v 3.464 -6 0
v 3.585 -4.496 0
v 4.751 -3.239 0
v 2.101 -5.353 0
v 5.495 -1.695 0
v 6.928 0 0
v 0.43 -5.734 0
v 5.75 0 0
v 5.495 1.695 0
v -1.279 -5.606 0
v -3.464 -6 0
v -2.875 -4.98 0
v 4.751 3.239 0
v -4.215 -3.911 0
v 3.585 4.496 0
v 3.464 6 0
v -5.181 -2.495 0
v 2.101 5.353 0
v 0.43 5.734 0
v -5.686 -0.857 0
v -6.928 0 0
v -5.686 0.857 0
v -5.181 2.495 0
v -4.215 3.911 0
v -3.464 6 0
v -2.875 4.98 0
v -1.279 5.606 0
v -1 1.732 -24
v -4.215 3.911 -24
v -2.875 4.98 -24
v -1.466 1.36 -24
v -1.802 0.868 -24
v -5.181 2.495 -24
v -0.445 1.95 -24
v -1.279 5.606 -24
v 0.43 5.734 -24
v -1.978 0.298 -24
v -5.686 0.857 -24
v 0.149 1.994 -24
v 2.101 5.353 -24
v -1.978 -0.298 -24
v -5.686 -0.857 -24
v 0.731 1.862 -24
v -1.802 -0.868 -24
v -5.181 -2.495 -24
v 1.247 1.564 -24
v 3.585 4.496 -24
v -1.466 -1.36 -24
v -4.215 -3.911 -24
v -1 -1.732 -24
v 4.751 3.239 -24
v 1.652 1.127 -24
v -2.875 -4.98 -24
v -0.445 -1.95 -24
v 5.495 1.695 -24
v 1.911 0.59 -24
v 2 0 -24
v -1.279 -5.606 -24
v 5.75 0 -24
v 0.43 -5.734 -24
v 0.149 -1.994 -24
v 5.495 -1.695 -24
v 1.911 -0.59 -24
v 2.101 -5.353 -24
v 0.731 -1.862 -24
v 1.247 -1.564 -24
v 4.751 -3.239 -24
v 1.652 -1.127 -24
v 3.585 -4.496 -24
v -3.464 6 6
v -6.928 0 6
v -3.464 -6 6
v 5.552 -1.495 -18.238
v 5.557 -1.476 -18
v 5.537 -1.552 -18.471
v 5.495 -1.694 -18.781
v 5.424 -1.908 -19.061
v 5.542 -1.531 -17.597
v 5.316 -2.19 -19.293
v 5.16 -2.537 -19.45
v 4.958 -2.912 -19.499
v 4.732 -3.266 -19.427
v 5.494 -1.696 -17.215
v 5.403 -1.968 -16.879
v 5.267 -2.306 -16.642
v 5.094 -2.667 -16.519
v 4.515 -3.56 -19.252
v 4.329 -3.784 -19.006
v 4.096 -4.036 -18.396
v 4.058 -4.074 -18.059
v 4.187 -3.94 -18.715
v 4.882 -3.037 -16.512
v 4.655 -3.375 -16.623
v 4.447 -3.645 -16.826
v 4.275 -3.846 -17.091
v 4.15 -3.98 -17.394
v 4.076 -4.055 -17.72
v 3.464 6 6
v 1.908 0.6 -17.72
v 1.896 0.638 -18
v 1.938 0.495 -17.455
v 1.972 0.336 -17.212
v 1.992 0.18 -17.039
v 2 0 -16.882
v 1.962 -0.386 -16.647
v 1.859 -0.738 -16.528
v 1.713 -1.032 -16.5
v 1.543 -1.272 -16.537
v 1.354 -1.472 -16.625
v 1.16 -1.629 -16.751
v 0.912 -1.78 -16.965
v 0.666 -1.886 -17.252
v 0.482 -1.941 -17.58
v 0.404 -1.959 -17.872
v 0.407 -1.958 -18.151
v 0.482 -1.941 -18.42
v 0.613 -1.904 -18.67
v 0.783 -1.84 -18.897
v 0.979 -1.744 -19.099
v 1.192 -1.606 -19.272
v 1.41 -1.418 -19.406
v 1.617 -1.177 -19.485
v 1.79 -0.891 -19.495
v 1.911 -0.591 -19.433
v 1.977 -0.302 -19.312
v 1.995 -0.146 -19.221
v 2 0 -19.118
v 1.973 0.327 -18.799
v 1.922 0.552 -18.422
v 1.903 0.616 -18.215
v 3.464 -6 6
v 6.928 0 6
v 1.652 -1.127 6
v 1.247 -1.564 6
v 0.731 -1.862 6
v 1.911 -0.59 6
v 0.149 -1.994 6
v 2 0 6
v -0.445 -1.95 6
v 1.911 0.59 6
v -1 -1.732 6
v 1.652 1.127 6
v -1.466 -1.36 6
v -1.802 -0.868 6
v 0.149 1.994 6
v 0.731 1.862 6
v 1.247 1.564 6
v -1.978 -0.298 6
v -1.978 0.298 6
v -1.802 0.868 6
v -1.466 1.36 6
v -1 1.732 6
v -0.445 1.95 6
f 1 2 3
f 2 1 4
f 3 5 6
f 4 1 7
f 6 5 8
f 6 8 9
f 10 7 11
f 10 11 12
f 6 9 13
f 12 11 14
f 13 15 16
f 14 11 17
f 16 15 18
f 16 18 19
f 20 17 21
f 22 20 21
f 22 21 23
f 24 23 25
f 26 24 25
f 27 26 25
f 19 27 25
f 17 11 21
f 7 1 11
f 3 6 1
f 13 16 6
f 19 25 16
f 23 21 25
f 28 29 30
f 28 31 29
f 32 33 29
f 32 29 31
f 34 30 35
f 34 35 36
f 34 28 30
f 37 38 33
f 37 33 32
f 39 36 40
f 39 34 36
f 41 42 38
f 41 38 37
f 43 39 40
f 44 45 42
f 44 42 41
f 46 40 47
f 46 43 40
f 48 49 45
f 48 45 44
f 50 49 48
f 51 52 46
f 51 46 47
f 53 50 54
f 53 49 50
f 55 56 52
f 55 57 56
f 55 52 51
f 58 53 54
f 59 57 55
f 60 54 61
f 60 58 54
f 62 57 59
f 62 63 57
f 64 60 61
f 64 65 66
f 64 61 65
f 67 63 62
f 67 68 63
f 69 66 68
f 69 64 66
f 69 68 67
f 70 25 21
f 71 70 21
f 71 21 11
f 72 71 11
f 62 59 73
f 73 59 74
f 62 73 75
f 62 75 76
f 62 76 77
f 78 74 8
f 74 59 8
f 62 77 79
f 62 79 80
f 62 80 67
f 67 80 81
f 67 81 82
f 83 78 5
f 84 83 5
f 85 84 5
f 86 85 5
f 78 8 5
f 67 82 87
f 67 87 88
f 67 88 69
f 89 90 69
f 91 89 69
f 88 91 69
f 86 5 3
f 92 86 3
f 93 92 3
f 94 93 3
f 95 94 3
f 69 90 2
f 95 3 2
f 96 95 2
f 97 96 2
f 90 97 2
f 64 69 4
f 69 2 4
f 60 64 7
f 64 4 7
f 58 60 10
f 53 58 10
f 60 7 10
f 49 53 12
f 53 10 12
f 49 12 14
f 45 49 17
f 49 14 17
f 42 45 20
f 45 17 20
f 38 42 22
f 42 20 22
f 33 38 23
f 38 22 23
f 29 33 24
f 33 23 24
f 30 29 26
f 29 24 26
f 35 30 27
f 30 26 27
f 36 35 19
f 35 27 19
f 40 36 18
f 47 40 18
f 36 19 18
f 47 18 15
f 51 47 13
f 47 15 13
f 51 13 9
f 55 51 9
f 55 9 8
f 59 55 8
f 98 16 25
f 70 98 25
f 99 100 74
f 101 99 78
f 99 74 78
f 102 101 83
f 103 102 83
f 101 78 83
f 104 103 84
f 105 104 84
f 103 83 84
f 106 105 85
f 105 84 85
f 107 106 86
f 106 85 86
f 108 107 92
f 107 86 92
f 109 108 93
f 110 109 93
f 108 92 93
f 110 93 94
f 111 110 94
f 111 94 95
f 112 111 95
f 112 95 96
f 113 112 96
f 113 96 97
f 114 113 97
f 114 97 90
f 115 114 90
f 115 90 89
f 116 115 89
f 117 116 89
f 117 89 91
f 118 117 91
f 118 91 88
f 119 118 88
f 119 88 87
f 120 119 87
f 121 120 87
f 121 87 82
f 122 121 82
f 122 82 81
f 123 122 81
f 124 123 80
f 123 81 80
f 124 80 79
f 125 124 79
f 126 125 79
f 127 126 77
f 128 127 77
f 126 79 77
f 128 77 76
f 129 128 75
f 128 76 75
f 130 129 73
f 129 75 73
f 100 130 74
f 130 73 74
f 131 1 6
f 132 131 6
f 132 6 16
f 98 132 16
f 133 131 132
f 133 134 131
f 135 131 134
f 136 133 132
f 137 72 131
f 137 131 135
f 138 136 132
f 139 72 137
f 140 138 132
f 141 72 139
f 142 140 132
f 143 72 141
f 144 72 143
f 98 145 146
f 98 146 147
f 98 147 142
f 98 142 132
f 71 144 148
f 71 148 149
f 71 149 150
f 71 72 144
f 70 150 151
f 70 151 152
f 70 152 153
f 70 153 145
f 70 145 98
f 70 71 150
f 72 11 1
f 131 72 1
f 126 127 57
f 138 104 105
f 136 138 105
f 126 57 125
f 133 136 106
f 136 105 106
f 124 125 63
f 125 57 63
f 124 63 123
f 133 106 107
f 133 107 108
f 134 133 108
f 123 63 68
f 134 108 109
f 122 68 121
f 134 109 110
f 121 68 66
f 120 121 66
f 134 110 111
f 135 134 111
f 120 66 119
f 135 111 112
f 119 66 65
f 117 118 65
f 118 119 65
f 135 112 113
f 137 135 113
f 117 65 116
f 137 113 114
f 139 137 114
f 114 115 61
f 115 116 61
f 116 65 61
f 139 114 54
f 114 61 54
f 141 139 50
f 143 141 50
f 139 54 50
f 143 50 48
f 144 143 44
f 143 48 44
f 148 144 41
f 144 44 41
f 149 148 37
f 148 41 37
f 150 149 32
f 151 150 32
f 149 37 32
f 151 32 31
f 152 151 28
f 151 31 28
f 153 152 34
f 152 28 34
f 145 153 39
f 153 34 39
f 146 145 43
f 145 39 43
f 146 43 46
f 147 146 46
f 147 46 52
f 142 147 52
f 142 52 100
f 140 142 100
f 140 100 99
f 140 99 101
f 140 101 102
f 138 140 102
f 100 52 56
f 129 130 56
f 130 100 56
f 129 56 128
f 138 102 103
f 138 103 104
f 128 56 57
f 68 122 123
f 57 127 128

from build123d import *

# Parameters (mm, degrees)
BOSS_EXTRUDE1_DEPTH = 6
SKETCH2_R           = 5.75
BOSS_EXTRUDE2_DEPTH = 24
SKETCH4_R           = 2
CUT_EXTRUDE2_DEPTH  = 31
SKETCH5_R           = 1.5
CUT_EXTRUDE3_DEPTH  = 6


with BuildPart() as part:
    # Sketch1 → Boss-Extrude1 (new body)
    with BuildSketch(Plane(origin=(0, 0, 0), x_dir=(0, 1, 0), z_dir=(0, 0, 1))):
        Polygon((0, 6.92820323), (-6, 3.464101615), (-6, -3.464101615), (0, -6.92820323), (6, -3.464101615), (6, 3.464101615), align=None)
    extrude(amount=BOSS_EXTRUDE1_DEPTH)

    # Sketch2 → Boss-Extrude2 (add)
    with BuildSketch(Plane(origin=(0, 0, 0), x_dir=(1, 0, 0), z_dir=(0, 0, -1))):
        Circle(SKETCH2_R)
    extrude(amount=BOSS_EXTRUDE2_DEPTH)

    # Sketch4 → Cut-Extrude2 (cut, through all)
    with BuildSketch(Plane(origin=(0, 0, -24), x_dir=(1, 0, 0), z_dir=(0, 0, -1))):
        Circle(SKETCH4_R)
    extrude(amount=-CUT_EXTRUDE2_DEPTH, mode=Mode.SUBTRACT)

    # Sketch5 → Cut-Extrude3 (cut)
    with BuildSketch(Plane(origin=(5.196152423, -3, 0), x_dir=(0.5, 0.866025404, 0), z_dir=(0.866025404, -0.5, 0))):
        with Locations((0, -18)):
            Circle(SKETCH5_R)
    extrude(amount=-CUT_EXTRUDE3_DEPTH, mode=Mode.SUBTRACT)


solid = part.part
